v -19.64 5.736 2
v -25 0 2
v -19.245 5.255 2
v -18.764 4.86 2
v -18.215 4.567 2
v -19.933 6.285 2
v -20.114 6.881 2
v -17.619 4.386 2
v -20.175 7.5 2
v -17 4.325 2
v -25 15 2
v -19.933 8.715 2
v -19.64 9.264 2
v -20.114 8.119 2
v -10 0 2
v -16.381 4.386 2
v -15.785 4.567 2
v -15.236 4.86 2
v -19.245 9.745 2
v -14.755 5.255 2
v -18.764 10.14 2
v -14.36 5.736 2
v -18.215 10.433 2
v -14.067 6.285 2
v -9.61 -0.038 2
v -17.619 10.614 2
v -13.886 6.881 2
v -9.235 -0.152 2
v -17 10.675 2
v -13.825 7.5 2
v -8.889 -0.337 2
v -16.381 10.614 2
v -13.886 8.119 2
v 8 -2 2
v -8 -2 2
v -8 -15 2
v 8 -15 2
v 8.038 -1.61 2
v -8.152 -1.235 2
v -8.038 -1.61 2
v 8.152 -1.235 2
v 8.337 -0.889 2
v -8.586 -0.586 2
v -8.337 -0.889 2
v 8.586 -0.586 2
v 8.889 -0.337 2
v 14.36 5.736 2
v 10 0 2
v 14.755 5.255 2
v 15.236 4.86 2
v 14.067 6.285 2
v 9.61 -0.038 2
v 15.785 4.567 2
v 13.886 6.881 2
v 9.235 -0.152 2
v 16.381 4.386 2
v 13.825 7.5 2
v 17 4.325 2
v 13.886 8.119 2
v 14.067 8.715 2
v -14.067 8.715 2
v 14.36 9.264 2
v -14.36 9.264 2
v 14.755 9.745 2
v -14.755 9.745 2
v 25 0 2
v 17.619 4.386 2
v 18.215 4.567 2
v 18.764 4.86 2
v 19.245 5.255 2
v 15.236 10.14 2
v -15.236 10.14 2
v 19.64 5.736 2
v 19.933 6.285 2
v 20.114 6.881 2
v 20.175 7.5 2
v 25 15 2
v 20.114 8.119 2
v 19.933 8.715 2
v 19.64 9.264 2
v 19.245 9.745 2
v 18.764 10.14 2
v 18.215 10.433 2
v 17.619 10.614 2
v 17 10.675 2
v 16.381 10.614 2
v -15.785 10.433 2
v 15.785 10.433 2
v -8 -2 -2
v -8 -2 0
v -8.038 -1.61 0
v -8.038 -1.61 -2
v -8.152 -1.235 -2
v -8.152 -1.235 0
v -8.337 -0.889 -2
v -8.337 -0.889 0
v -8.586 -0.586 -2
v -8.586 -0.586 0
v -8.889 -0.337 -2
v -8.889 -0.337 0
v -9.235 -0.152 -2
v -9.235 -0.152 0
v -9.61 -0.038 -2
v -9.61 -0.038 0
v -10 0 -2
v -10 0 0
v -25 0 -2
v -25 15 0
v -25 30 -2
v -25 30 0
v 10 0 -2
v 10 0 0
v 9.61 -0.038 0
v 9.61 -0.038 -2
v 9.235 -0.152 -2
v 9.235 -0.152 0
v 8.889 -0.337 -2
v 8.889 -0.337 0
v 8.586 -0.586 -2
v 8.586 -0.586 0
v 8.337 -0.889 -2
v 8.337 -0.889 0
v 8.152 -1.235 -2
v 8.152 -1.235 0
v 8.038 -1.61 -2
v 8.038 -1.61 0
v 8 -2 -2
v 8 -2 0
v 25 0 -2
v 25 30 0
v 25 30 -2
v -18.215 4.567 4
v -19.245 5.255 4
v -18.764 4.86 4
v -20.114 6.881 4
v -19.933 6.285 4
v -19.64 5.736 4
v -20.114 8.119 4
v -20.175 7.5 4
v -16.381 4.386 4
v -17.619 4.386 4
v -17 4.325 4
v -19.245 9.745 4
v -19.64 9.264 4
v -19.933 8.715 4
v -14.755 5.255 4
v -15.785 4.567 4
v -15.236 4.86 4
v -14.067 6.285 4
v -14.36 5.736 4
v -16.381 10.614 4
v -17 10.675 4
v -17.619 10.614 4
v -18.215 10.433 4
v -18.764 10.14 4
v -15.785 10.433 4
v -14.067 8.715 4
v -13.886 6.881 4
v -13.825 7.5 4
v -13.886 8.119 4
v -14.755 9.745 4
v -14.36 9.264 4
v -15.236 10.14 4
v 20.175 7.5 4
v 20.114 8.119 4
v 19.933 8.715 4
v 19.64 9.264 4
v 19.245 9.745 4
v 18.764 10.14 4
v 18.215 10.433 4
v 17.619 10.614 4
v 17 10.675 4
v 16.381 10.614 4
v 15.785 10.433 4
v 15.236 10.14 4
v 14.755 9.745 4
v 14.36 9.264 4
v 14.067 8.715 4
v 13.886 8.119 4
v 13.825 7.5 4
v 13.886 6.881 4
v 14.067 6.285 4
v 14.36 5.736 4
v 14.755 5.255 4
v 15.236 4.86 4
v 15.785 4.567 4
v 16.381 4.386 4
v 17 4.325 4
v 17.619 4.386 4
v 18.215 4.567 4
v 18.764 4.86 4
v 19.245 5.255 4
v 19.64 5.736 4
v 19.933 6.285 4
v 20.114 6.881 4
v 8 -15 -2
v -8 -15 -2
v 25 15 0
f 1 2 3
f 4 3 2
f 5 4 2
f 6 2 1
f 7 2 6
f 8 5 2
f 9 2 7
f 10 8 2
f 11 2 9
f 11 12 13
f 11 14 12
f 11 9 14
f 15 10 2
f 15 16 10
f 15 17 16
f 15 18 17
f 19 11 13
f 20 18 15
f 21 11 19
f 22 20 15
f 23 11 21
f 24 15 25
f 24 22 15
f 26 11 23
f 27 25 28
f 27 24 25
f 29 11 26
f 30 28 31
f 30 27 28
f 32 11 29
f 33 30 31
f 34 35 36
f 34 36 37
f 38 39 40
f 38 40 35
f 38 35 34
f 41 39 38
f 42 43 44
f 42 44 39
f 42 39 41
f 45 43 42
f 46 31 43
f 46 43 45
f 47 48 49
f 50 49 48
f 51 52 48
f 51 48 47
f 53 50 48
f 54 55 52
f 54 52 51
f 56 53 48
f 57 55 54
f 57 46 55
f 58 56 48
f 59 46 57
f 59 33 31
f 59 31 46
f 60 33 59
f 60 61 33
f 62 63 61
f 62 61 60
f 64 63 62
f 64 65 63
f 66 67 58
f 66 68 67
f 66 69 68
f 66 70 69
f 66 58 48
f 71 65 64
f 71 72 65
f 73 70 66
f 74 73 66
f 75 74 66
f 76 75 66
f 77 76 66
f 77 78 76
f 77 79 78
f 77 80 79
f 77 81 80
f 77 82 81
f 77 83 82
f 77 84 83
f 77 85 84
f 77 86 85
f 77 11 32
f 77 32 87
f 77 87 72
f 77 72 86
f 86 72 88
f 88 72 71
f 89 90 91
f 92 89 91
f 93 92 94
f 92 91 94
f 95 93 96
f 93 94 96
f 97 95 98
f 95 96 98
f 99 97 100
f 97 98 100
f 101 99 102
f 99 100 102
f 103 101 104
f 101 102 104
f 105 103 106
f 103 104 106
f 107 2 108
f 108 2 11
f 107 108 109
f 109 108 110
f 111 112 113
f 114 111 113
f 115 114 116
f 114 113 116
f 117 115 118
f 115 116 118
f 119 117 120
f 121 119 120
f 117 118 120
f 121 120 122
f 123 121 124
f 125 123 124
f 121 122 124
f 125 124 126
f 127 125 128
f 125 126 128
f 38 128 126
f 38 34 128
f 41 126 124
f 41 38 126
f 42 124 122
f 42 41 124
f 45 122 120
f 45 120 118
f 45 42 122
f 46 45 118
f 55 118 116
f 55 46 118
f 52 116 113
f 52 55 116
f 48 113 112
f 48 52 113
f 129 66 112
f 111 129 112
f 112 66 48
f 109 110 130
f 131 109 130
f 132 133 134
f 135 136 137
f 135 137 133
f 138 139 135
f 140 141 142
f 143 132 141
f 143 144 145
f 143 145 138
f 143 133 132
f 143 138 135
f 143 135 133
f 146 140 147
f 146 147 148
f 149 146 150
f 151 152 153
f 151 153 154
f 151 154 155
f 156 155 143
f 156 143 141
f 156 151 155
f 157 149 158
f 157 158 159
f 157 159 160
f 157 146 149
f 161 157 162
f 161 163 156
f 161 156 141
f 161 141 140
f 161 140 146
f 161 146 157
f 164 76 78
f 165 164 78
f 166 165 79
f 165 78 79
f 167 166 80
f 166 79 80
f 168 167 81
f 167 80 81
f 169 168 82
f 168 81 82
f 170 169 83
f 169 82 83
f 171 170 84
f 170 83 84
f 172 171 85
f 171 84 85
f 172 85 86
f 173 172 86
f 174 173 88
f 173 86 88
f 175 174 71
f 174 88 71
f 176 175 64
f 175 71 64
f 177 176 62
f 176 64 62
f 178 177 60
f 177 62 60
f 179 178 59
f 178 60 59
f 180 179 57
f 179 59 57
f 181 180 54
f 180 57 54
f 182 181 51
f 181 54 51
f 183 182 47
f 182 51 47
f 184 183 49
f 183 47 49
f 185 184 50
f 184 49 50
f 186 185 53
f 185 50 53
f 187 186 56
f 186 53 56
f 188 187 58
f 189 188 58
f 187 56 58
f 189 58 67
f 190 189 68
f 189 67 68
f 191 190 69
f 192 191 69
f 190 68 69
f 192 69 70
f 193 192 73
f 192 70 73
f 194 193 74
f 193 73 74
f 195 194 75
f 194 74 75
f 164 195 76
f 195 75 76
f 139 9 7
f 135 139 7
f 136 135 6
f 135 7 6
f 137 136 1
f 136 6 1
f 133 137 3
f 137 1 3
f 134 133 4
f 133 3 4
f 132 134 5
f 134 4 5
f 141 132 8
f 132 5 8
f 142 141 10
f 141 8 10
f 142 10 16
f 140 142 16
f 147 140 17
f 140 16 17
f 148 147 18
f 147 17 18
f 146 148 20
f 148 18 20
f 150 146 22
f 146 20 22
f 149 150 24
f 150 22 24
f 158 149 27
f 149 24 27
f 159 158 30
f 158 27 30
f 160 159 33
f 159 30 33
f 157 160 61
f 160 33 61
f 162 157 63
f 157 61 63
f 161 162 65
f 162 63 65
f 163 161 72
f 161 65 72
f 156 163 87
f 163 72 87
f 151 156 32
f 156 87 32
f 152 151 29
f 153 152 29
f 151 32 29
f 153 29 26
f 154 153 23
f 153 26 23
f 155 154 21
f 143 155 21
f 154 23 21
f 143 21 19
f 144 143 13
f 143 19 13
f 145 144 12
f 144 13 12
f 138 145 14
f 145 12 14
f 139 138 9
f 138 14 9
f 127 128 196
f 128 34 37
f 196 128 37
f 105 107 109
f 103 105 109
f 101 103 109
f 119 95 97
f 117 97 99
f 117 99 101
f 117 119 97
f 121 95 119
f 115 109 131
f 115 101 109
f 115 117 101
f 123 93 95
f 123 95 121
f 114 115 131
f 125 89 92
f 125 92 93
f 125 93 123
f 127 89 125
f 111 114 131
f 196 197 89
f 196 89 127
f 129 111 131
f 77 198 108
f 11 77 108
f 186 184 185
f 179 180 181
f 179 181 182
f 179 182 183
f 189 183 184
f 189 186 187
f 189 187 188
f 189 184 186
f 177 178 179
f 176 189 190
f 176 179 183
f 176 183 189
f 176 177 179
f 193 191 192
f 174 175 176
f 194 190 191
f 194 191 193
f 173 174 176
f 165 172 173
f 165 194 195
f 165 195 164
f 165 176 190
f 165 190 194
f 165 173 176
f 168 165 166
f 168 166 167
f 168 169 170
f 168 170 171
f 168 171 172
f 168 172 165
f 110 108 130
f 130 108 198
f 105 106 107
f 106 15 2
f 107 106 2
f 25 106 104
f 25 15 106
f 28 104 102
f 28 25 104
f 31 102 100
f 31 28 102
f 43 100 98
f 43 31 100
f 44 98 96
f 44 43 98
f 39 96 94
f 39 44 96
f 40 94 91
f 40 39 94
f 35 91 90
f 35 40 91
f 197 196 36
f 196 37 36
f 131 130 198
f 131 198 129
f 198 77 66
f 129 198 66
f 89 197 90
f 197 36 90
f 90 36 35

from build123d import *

# Parameters (mm, degrees)
F1_DEPTH = 2
F2_R     = 2
F3_R     = 3.175
F4_DEPTH = 2
F5_W     = 50
F5_H     = 15
F6_DEPTH = 2


with BuildPart() as f1:
    # F0 (on Top) → F1 (new body)
    with BuildSketch(Plane.XY):
        Polygon((-8, -15), (8, -15), (8, 0), (25, 0), (25, 15), (-25, 15), (-25, 0), (-8, 0), align=None)
    extrude(amount=F1_DEPTH)

    # F2
    f2_edges = [f1.edges().sort_by_distance(p)[0] for p in [
        (-8, 0, 1),
        (8, 0, 1),
    ]]
    fillet(f2_edges, radius=F2_R)

    # F3 (on face) → F4 (join)
    with BuildSketch(Plane.XY.offset(2)):
        with BuildLine():
            ThreePointArc((-13.825, 7.5), (-17, 10.675), (-20.175, 7.5))
            ThreePointArc((-20.175, 7.5), (-17, 4.325), (-13.825, 7.5))
        make_face()
        with Locations((17, 7.5)):
            Circle(F3_R)
    extrude(amount=F4_DEPTH)

    # F5 (on face) → F6 (join)
    with BuildSketch(Plane(origin=(0, 0, 0), x_dir=(1, 0, 0), z_dir=(0, 0, -1))):
        with BuildLine():
            Line((8, 2), (8, 15))
            Line((8, 15), (-8, 15))
            Line((-8, 15), (-8, 2))
            ThreePointArc((-8, 2), (-8.585786, 0.585786), (-10, 0))
            Line((-10, 0), (-25, 0))
            Line((-25, 0), (-25, -15))
            Line((-25, -15), (25, -15))
            Line((25, -15), (25, 0))
            Line((25, 0), (10, 0))
            ThreePointArc((10, 0), (8.585786, 0.585786), (8, 2))
        make_face()
        with Locations((0, -22.5)):
            Rectangle(F5_W, F5_H)
    extrude(amount=F6_DEPTH)


solid = f1.part
